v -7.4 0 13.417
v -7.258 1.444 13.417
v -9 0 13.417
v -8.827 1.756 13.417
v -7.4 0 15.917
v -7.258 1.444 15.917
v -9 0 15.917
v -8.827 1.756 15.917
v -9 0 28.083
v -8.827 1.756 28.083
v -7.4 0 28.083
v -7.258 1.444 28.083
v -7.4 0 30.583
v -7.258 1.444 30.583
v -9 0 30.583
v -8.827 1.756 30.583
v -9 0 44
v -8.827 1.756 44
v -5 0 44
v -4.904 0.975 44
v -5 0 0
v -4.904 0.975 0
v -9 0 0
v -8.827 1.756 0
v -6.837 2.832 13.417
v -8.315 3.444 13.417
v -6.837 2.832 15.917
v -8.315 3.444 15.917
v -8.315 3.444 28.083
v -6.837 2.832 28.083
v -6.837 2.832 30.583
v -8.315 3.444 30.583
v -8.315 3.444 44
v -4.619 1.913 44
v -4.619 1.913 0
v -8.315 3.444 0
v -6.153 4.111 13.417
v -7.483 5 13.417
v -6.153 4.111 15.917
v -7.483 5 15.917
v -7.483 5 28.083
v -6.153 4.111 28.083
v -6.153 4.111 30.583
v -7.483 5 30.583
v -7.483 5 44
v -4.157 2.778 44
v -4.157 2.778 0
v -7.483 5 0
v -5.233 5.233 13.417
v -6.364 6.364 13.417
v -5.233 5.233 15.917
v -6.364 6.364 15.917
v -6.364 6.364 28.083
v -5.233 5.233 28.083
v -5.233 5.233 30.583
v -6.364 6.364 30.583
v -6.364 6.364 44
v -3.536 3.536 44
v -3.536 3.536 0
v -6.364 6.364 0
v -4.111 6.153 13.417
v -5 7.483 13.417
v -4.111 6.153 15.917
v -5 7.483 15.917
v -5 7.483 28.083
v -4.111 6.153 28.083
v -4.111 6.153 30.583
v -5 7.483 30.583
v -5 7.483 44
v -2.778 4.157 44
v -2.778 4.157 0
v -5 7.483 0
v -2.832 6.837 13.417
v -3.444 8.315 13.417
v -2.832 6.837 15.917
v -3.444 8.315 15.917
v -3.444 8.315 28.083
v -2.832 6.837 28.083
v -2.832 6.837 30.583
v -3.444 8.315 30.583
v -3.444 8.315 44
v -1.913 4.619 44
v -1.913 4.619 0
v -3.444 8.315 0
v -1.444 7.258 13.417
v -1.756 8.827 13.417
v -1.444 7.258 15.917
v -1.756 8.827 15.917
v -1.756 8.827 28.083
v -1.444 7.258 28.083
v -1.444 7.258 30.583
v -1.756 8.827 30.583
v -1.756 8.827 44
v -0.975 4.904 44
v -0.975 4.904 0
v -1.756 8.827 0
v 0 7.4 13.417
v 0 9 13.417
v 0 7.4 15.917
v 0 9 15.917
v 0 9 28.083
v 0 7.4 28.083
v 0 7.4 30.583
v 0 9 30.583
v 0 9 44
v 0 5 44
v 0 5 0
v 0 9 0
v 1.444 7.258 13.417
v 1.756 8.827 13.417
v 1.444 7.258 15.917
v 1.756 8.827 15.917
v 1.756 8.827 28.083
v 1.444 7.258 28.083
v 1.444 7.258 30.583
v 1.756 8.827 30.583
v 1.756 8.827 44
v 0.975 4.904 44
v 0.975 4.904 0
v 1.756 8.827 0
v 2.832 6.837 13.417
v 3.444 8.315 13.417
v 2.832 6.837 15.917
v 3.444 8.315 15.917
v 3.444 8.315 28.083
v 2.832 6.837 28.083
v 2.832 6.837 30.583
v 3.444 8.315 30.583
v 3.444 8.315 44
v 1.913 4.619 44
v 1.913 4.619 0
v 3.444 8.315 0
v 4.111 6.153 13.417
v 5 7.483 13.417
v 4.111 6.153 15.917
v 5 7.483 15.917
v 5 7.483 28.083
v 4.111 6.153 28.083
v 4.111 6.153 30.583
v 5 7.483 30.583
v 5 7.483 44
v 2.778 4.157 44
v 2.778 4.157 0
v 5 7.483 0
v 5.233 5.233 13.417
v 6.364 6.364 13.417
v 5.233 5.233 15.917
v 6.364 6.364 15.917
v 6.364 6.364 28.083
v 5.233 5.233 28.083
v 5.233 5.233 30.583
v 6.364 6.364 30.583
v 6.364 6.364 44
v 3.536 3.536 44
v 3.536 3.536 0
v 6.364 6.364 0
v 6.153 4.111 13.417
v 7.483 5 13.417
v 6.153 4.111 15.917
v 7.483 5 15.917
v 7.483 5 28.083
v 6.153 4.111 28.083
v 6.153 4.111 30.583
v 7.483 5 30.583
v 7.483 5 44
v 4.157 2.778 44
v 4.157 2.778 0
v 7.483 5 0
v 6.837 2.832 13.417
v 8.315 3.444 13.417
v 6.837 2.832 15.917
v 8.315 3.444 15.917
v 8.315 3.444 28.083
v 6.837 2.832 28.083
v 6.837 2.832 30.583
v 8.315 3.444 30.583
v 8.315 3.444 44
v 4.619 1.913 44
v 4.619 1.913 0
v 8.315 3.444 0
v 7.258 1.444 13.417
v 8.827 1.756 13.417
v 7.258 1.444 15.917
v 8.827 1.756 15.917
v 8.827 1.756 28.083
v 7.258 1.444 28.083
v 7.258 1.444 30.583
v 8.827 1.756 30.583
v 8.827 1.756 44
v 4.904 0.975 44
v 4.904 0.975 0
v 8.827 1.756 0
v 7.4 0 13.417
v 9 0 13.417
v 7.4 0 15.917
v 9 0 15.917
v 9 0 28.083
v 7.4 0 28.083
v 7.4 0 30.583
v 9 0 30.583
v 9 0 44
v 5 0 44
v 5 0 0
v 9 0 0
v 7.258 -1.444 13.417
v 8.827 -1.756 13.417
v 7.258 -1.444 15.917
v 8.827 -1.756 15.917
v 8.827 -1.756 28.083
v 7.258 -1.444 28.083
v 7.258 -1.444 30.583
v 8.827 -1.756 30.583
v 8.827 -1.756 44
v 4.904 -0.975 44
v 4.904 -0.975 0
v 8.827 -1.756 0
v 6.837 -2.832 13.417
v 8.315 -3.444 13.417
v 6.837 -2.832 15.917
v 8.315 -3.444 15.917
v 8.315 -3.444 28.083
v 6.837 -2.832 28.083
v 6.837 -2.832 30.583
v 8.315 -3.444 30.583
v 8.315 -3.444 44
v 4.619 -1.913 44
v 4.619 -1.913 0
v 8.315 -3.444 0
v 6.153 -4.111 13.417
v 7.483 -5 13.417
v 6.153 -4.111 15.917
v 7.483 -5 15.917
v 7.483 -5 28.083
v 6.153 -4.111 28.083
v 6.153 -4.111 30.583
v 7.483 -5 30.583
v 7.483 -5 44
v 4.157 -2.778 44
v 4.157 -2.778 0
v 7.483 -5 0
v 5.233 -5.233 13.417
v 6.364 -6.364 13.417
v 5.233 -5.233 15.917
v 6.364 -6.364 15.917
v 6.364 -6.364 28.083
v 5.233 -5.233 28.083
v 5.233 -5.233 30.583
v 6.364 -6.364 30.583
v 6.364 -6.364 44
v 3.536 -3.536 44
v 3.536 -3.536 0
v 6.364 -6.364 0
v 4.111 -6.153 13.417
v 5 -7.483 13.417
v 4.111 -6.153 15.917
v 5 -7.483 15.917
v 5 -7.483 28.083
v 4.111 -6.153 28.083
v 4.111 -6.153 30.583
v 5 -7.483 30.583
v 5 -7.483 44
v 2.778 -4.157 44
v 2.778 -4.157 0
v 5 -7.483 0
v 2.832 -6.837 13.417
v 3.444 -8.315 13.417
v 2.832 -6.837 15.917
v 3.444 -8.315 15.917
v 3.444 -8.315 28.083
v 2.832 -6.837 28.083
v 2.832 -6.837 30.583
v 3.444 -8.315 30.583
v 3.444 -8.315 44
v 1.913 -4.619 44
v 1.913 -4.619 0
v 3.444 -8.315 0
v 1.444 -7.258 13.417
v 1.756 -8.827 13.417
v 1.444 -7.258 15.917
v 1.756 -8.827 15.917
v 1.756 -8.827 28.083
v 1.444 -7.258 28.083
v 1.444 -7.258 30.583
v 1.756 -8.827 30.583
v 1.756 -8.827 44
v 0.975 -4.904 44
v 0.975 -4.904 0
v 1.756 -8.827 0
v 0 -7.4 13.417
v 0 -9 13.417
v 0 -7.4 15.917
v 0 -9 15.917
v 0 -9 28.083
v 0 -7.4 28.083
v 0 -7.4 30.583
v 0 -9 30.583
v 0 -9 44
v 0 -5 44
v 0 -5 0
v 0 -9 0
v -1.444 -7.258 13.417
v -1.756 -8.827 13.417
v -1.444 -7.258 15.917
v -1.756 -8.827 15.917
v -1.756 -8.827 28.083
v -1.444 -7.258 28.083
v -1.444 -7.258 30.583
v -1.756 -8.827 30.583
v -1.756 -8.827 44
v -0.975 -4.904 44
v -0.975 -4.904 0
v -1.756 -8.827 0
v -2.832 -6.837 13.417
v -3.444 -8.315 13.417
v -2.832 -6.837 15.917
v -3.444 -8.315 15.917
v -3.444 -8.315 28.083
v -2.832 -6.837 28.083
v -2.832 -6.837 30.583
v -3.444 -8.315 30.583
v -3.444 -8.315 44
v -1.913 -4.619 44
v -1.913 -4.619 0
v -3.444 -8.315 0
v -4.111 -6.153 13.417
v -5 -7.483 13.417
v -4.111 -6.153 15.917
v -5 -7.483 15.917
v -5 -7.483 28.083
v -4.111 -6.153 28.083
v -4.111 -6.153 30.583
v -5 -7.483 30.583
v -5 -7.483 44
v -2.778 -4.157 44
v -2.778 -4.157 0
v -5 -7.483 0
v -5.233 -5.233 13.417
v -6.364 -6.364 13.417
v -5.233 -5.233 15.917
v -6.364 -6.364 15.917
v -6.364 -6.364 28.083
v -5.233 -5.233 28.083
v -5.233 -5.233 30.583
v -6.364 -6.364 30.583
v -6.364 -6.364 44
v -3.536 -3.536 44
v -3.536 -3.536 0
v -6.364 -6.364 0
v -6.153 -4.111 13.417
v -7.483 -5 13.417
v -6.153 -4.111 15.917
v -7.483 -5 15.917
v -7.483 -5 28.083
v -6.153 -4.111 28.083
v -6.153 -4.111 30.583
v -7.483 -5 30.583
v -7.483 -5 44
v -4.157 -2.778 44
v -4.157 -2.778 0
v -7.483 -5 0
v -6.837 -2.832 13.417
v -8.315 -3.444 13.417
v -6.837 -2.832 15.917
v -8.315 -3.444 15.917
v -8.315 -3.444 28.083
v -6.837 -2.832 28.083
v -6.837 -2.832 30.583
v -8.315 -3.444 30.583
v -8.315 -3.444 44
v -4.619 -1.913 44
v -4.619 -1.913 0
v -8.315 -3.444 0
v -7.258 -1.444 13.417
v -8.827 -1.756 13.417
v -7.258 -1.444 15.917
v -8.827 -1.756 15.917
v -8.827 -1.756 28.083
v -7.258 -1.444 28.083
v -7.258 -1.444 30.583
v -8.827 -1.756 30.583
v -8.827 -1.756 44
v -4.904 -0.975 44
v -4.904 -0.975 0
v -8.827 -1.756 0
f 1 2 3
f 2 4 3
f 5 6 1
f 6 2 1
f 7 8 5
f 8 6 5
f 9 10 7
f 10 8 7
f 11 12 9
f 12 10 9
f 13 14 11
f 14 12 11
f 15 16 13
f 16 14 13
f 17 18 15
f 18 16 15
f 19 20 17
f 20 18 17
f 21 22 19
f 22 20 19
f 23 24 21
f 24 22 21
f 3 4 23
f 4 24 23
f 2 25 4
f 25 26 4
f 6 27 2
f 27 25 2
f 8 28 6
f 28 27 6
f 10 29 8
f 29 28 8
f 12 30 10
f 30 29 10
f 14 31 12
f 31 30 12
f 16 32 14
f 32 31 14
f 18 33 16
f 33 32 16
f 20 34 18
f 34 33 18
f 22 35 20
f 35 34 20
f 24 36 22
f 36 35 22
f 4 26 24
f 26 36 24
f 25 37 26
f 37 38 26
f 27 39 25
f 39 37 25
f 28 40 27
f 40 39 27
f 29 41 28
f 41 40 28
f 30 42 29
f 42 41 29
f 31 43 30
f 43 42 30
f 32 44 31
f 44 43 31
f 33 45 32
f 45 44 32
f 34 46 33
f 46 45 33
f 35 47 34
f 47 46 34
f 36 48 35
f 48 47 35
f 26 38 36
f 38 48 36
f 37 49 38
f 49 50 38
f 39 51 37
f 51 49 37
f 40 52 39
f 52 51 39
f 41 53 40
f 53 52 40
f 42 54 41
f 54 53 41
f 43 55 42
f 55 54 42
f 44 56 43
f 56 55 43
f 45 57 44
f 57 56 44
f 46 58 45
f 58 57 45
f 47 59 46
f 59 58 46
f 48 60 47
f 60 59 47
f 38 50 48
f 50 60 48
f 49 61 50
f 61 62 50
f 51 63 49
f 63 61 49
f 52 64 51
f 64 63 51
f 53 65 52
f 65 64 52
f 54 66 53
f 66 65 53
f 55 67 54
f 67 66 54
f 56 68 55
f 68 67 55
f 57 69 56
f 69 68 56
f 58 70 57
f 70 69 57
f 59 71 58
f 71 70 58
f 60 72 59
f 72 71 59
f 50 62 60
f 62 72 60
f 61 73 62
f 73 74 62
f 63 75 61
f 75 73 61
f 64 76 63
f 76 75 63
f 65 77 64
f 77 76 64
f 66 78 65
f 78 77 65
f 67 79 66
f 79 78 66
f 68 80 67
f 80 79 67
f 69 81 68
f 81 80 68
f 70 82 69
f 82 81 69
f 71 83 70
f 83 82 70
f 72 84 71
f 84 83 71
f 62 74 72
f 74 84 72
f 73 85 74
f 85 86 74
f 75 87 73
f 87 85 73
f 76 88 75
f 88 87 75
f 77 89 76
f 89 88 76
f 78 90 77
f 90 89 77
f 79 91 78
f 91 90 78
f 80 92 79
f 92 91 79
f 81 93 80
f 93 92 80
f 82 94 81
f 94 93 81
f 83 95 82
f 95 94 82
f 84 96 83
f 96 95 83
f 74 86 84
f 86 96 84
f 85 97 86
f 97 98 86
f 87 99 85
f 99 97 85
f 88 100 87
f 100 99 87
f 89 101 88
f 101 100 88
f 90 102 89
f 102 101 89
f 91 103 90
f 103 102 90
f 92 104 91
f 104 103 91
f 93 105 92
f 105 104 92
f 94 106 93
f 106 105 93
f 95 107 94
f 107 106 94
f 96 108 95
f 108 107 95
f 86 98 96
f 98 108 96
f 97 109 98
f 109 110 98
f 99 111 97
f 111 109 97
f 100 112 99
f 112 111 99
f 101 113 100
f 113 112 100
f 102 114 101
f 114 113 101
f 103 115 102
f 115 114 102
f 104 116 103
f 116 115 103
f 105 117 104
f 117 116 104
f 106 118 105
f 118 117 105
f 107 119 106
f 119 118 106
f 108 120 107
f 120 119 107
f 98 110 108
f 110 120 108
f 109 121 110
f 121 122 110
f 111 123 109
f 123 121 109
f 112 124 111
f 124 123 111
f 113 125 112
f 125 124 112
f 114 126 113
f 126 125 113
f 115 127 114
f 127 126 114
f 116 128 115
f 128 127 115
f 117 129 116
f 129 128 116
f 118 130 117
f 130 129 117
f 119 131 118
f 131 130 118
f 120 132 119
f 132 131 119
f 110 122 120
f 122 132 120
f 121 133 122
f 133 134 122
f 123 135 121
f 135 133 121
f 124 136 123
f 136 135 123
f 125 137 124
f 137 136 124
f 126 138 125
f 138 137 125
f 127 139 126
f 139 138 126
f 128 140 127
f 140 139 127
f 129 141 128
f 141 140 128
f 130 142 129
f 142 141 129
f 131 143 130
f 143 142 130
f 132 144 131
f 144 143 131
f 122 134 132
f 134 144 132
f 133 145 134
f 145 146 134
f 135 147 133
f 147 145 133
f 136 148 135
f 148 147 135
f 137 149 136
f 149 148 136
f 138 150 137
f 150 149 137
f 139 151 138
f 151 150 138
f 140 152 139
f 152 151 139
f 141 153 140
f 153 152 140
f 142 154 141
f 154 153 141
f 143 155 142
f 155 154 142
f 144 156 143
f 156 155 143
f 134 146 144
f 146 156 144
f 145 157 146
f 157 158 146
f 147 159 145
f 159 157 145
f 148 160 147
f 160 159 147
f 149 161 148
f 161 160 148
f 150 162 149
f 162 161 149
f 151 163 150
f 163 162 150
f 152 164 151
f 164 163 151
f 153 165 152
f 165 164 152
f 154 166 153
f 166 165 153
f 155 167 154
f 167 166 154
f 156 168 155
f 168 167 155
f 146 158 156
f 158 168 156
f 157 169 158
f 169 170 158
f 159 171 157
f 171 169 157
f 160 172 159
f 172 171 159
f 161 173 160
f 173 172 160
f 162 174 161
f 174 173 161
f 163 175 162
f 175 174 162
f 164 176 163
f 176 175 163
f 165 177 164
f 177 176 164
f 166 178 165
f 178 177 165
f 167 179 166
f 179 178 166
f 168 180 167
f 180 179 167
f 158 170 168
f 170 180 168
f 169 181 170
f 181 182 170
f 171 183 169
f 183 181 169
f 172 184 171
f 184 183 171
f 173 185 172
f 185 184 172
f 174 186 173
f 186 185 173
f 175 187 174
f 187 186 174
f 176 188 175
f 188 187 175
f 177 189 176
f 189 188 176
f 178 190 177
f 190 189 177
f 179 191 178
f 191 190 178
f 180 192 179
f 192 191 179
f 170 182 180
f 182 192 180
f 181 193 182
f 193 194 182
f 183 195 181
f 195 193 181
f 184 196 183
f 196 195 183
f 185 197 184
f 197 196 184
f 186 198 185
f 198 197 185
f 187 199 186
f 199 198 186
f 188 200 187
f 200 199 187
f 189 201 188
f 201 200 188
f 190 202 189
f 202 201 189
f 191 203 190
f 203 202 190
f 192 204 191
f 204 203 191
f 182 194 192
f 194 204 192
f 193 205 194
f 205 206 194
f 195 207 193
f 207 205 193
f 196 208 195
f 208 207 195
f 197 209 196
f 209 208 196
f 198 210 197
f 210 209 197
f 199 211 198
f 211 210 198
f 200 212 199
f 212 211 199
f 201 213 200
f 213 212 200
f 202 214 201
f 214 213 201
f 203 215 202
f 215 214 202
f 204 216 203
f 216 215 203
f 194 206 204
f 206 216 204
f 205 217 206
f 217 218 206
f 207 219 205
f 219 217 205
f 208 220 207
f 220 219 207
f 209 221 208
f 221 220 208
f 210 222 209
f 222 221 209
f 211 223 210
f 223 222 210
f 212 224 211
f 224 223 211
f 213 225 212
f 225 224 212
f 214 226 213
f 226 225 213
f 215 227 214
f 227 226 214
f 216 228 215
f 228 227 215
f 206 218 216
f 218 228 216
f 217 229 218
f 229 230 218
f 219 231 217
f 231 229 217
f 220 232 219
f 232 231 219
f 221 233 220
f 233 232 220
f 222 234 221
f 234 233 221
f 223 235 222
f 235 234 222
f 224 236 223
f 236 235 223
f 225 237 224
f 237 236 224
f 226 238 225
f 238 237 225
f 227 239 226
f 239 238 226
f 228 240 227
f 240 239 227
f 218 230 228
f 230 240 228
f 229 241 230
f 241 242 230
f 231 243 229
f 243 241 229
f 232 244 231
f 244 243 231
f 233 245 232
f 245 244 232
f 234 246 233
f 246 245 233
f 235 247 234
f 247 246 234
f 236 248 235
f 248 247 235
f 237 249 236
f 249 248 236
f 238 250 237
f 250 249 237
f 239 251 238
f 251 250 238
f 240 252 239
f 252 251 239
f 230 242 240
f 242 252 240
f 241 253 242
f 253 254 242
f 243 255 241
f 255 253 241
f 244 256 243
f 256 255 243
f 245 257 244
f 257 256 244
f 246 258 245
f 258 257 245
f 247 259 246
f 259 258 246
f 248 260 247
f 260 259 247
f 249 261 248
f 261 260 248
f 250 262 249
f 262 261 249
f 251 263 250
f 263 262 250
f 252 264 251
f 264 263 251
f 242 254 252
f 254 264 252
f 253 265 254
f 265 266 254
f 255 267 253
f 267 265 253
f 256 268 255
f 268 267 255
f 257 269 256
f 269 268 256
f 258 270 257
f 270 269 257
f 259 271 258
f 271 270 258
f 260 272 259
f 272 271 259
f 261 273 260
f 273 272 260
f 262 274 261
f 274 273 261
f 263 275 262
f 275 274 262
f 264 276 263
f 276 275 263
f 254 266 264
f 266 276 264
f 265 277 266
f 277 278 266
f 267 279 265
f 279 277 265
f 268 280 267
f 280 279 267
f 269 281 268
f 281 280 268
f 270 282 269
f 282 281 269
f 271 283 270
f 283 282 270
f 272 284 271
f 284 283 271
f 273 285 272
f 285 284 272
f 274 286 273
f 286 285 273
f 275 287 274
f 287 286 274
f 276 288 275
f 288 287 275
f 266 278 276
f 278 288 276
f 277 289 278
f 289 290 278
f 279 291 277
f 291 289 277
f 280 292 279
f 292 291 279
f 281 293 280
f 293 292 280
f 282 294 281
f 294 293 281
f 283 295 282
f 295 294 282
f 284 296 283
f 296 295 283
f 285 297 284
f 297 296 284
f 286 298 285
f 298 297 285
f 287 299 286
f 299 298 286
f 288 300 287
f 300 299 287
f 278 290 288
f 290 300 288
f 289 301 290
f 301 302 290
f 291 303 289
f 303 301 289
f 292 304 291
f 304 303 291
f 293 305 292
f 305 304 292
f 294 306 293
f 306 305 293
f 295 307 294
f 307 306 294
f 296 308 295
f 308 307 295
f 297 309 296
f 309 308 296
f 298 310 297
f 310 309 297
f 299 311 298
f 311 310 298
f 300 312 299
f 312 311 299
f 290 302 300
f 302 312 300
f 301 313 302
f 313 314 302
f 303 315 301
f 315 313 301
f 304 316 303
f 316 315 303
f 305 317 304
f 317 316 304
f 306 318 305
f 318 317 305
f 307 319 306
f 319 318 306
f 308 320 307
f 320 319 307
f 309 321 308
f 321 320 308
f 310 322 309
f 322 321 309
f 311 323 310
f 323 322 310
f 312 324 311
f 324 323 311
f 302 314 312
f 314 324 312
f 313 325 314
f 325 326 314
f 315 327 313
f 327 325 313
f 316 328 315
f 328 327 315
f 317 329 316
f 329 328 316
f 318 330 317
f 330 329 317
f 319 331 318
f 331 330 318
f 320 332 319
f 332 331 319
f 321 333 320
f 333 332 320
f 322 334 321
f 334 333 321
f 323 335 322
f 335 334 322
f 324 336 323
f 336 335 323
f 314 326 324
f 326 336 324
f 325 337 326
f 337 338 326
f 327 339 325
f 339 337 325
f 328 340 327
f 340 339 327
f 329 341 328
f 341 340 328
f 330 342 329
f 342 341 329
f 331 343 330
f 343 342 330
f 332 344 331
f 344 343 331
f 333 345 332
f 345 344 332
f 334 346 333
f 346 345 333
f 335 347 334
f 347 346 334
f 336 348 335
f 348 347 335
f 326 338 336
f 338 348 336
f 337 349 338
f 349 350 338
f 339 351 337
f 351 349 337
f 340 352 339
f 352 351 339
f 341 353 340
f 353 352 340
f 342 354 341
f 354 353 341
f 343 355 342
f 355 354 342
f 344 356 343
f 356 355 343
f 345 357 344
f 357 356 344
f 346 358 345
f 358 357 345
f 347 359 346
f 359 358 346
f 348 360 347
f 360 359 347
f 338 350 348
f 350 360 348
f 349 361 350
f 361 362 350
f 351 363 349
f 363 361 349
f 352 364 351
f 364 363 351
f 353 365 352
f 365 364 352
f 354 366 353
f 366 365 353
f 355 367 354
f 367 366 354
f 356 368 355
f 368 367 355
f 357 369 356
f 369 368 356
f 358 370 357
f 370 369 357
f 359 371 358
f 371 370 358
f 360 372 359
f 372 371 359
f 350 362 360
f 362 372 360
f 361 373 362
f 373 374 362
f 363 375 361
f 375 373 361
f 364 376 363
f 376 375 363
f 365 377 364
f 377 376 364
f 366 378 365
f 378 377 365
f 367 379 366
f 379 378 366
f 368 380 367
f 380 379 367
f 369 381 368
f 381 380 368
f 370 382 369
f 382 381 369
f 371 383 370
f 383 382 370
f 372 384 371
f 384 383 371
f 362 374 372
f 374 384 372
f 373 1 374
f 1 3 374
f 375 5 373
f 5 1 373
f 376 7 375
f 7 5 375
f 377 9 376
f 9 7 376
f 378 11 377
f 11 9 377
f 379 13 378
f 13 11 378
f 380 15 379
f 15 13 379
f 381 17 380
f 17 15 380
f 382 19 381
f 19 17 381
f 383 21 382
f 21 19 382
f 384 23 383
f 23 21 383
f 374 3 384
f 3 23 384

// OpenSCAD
$fn = 32;

// ----------------------------------------------------------------------
// Grooved revolve: stepped, bore R5
// ----------------------------------------------------------------------

// --- parameters (mm) ---
bore_r = 5;               // bore radius
outer_r = 9;              // outer radius of the body
total_h = 44;             // overall height, Z
wall = 4;                 // radial wall thickness
groove_w = 2.5;           // groove width
groove_d = 1.6;           // groove depth
grooves = 2;              // number of outer grooves

bbox_x = 2 * outer_r;  // full diameter
bore_d = 2 * bore_r;  // bore diameter
body_d = 2 * outer_r;  // body diameter
revolve_angle = 360;  // full turn around the Z axis

profile = [[5, 0], [9, 0], [9, 13.417], [7.4, 13.417], [7.4, 15.917], [9, 15.917], [9, 28.083], [7.4, 28.083], [7.4, 30.583], [9, 30.583], [9, 44], [5, 44]];  // primary outline, 12 points, counter clockwise

// --- the one profile operation ---
rotate_extrude(angle = revolve_angle) polygon(points = profile);
